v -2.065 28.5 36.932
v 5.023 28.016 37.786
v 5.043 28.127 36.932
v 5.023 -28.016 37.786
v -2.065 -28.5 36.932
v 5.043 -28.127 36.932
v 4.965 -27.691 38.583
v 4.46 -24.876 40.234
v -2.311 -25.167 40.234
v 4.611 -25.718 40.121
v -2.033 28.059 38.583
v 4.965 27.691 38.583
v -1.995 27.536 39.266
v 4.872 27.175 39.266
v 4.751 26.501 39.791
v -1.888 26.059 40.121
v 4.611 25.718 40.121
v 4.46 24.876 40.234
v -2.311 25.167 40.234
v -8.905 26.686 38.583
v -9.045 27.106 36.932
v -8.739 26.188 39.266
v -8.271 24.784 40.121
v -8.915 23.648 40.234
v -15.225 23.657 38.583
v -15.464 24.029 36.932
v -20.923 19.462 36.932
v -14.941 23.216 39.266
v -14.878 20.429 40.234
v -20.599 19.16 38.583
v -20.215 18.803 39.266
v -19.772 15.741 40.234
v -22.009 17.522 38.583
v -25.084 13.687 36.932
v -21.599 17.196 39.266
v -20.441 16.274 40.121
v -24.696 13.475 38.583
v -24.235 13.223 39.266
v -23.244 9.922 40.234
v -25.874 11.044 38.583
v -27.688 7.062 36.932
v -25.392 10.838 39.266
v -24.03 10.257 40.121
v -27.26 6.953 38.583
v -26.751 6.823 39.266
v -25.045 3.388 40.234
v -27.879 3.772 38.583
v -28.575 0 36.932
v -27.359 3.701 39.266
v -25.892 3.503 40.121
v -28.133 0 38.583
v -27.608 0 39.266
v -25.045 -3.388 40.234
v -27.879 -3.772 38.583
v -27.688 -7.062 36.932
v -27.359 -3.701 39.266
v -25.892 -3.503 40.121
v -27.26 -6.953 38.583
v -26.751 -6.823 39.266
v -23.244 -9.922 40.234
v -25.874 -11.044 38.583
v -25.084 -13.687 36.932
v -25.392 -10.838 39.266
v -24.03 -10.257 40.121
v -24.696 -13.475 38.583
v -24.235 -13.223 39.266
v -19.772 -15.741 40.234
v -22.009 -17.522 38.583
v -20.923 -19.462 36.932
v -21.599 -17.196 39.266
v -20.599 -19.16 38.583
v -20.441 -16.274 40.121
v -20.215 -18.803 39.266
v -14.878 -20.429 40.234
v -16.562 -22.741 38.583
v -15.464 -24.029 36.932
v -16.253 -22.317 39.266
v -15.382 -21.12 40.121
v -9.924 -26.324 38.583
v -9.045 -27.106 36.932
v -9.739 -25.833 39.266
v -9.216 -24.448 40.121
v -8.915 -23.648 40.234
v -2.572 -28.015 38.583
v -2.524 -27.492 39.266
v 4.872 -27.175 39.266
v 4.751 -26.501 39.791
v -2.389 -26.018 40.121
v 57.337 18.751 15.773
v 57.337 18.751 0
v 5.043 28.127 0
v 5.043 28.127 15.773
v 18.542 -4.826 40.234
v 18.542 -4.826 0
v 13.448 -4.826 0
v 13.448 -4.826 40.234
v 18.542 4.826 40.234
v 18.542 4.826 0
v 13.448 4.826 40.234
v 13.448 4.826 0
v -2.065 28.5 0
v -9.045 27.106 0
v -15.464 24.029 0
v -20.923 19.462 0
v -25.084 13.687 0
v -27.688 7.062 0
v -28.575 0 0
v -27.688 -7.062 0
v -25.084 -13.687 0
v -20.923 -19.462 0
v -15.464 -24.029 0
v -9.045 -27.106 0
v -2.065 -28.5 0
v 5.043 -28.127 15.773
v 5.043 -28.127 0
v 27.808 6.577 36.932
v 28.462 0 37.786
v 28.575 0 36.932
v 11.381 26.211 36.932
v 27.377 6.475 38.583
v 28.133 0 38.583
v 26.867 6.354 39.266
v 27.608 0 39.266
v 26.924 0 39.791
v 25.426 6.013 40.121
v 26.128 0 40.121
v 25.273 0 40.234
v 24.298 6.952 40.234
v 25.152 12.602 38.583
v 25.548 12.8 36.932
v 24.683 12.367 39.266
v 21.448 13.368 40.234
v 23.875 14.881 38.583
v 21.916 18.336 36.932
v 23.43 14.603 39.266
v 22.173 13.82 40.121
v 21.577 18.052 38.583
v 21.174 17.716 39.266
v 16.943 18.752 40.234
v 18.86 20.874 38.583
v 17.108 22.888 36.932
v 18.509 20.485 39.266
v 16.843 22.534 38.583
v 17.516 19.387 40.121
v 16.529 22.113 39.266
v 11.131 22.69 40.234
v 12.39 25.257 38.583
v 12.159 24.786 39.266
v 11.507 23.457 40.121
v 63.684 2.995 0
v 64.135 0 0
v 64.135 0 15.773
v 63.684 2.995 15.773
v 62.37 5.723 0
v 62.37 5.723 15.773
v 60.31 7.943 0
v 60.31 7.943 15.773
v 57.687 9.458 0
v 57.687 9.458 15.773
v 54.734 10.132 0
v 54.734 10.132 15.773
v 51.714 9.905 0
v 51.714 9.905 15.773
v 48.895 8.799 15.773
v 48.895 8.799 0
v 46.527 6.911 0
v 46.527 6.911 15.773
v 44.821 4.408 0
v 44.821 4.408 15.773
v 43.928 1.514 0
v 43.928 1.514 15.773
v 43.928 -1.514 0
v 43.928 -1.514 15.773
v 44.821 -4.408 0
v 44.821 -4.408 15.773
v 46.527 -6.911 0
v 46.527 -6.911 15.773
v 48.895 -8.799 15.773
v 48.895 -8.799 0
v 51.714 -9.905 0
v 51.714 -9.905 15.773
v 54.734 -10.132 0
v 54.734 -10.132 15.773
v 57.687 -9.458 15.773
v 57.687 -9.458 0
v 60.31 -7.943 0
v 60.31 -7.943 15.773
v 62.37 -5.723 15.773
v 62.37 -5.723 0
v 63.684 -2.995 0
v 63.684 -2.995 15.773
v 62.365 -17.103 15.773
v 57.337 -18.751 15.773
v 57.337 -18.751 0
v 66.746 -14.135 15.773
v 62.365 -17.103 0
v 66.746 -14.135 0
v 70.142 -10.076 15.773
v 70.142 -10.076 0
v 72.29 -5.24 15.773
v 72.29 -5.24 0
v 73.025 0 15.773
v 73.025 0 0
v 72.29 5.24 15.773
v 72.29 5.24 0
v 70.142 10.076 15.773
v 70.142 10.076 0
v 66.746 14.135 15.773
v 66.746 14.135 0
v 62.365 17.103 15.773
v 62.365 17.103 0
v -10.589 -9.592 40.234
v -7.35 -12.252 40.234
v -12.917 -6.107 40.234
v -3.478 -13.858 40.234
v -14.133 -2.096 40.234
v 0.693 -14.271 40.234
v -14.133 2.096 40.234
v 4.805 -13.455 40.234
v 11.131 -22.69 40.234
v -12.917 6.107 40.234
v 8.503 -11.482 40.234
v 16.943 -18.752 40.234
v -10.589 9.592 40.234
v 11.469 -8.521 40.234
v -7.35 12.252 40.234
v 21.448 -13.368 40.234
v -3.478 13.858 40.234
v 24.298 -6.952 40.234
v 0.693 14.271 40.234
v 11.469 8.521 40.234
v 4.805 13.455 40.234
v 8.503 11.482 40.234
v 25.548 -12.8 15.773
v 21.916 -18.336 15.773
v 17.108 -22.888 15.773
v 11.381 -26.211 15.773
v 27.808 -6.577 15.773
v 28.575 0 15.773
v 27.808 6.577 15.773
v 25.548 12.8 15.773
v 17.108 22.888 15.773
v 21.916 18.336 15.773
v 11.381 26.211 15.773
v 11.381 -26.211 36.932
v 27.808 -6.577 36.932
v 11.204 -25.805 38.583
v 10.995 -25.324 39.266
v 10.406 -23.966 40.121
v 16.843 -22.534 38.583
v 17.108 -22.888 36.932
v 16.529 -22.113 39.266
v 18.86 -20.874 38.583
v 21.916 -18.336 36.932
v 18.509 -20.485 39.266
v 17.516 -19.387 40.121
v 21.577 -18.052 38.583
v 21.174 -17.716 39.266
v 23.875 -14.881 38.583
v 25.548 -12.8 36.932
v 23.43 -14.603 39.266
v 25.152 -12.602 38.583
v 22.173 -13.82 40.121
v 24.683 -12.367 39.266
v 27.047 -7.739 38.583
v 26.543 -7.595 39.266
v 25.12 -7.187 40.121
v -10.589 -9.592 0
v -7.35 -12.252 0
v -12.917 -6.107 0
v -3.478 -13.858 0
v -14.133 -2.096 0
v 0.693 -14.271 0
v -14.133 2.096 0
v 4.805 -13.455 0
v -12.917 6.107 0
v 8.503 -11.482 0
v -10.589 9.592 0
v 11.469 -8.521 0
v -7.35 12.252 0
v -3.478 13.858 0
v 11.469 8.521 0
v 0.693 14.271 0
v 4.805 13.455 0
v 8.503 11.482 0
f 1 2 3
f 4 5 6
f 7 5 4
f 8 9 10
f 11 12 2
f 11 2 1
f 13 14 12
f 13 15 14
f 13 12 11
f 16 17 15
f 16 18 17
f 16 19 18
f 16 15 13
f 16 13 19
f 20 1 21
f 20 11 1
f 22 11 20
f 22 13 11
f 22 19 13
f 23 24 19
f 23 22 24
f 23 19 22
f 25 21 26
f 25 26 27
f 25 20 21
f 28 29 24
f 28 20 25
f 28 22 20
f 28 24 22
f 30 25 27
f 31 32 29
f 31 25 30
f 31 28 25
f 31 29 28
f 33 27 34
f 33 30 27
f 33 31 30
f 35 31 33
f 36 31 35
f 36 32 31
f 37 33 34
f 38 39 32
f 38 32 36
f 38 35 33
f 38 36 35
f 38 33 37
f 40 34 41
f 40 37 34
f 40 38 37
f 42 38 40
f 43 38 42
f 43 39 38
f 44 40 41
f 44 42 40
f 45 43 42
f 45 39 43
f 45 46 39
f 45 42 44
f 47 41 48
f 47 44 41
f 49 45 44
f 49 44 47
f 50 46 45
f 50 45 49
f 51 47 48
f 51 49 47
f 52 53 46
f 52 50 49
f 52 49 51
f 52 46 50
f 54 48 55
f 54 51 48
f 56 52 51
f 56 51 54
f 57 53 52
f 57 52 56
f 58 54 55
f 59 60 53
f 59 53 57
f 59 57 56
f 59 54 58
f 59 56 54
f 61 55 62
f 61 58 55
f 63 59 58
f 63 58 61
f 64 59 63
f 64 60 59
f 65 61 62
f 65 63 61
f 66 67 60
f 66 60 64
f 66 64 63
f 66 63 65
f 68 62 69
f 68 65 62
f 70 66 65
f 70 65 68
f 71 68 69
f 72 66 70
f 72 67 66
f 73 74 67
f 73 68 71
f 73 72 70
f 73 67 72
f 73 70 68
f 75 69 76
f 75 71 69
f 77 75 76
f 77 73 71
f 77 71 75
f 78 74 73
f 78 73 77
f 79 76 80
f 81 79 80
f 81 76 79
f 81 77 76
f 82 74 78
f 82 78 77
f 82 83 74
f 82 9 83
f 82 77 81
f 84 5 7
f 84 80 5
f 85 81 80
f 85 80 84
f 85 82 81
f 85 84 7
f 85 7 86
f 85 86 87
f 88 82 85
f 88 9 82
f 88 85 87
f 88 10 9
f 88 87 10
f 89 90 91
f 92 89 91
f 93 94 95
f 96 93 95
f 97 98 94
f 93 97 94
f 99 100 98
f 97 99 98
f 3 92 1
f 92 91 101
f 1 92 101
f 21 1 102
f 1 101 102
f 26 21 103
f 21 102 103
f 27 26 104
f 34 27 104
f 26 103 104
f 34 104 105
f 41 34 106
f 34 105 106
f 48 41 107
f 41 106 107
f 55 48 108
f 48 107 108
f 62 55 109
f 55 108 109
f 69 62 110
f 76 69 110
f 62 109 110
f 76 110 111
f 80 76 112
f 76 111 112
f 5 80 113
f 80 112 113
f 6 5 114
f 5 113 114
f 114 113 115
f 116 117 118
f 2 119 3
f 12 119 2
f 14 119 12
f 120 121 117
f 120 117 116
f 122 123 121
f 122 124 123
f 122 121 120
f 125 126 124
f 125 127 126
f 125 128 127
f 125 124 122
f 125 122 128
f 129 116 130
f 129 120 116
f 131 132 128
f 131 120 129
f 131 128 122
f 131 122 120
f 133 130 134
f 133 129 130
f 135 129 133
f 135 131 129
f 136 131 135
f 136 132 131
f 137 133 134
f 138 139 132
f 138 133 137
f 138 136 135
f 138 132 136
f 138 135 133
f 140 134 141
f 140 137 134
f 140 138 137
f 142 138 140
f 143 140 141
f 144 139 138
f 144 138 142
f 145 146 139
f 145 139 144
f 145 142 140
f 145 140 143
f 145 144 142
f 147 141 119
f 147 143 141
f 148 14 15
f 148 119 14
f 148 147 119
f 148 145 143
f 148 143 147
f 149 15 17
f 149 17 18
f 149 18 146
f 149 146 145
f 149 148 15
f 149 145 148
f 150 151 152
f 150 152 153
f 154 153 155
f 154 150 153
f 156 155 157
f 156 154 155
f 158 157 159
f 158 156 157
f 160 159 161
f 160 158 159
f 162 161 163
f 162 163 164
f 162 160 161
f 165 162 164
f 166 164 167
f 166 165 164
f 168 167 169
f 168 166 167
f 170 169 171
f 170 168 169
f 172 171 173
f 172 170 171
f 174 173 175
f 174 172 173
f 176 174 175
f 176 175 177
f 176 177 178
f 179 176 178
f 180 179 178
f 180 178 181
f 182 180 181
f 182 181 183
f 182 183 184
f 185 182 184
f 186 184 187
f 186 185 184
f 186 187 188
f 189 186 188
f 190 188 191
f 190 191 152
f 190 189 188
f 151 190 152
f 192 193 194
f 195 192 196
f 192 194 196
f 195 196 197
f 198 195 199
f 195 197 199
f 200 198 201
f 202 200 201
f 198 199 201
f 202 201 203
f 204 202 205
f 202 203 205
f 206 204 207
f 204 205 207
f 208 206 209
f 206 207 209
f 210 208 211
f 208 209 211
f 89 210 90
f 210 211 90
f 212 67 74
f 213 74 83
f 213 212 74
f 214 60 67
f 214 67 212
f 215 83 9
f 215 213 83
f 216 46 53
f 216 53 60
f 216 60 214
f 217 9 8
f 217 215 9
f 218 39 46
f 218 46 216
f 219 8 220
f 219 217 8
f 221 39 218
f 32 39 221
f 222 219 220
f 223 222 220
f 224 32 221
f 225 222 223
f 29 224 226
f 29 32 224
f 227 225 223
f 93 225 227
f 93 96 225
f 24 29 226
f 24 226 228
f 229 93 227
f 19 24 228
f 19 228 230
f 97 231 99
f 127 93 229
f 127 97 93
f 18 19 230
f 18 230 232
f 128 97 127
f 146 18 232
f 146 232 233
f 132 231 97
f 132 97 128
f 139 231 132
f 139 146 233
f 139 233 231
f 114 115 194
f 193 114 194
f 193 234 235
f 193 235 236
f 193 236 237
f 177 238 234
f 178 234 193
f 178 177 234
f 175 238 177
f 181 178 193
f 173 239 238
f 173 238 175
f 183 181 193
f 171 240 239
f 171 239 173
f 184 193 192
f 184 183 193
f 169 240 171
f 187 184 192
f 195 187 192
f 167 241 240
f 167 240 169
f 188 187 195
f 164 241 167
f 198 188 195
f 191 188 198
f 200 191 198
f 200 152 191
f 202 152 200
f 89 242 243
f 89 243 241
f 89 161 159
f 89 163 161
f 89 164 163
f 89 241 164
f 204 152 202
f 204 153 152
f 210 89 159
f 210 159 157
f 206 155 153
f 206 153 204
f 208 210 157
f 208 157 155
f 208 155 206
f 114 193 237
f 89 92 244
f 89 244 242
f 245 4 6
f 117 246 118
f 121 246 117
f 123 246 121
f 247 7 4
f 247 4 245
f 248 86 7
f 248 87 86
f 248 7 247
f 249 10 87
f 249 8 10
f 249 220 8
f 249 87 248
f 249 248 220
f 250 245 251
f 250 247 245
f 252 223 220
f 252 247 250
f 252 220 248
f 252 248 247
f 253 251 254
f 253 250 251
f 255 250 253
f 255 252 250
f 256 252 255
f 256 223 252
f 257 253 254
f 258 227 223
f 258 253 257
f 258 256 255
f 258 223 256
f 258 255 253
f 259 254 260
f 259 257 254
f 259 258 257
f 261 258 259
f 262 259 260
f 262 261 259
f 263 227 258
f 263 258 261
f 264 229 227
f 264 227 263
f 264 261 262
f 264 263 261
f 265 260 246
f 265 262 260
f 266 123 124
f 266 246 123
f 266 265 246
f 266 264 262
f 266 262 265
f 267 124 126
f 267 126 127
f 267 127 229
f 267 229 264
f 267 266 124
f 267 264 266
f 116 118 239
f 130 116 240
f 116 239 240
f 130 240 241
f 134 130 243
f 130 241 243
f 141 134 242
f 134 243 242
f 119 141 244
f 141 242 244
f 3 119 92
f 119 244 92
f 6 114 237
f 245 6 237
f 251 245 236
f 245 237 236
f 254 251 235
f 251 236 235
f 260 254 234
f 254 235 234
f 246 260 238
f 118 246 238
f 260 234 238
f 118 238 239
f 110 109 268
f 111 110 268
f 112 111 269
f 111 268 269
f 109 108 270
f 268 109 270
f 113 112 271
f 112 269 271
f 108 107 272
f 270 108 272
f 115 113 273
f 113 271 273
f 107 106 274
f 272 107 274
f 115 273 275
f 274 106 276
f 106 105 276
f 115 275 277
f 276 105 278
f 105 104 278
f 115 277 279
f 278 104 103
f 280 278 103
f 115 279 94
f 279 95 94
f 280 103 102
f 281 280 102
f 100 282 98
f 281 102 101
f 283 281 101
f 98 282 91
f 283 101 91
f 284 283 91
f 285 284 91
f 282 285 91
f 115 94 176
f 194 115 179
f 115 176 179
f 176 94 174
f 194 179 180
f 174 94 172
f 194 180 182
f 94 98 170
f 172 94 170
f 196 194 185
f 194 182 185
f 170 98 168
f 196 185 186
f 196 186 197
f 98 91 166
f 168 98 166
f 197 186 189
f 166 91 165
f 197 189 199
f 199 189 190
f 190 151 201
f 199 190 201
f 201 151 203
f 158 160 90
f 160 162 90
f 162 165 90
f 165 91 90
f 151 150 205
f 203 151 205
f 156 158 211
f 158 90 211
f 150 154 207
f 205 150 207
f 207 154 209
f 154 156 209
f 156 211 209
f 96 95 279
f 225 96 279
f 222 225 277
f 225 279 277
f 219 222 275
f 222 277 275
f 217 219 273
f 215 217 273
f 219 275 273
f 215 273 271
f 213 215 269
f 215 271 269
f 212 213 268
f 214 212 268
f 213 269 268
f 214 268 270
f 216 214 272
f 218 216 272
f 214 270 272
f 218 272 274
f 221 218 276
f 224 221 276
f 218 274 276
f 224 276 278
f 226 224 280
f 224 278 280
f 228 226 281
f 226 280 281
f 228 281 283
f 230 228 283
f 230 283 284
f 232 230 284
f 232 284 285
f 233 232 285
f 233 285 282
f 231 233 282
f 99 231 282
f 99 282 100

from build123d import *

# Parameters (mm, degrees)
F1_DEPTH = 40.2336
F0_R     = 10.16
F2_DEPTH = 15.7734
F3_R     = 3.302


with BuildPart() as f1:
    # F0 (on Top) → F1 (new body)
    with BuildSketch(Plane.XY):
        with BuildLine():
            ThreePointArc((5.042647, 28.126541), (-28.575, 0), (5.042647, -28.126541))
            ThreePointArc((5.042647, -28.126541), (21.916025, -18.336262), (28.575, 0))
            ThreePointArc((28.575, 0), (21.916025, 18.336262), (5.042647, 28.126541))
        make_face()
        with BuildLine():
            ThreePointArc((13.447765, -4.826), (-14.2875, 0), (13.447765, 4.826))
            Line((13.447765, 4.826), (18.542, 4.826))
            Line((18.542, 4.826), (18.542, -4.826))
            Line((18.542, -4.826), (13.447765, -4.826))
        make_face(mode=Mode.SUBTRACT)
    extrude(amount=F1_DEPTH)

    # F0 (on Top) → F2 (join)
    with BuildSketch(Plane.XY):
        with BuildLine():
            Line((5.042647, -28.126541), (57.336765, -18.751028))
            ThreePointArc((57.336765, -18.751028), (73.025, 0), (57.336765, 18.751028))
            Line((57.336765, 18.751028), (5.042647, 28.126541))
            ThreePointArc((5.042647, 28.126541), (21.916025, 18.336262), (28.575, 0))
            ThreePointArc((28.575, 0), (21.916025, -18.336262), (5.042647, -28.126541))
        make_face()
        with Locations((53.975, 0)):
            Circle(F0_R, mode=Mode.SUBTRACT)
    extrude(amount=F2_DEPTH)

    # F3
    f3_edges = [f1.edges().sort_by_distance(p)[0] for p in [
        (-5.042647, 28.126541, 40.2336),
    ]]
    fillet(f3_edges, radius=F3_R)


solid = f1.part
